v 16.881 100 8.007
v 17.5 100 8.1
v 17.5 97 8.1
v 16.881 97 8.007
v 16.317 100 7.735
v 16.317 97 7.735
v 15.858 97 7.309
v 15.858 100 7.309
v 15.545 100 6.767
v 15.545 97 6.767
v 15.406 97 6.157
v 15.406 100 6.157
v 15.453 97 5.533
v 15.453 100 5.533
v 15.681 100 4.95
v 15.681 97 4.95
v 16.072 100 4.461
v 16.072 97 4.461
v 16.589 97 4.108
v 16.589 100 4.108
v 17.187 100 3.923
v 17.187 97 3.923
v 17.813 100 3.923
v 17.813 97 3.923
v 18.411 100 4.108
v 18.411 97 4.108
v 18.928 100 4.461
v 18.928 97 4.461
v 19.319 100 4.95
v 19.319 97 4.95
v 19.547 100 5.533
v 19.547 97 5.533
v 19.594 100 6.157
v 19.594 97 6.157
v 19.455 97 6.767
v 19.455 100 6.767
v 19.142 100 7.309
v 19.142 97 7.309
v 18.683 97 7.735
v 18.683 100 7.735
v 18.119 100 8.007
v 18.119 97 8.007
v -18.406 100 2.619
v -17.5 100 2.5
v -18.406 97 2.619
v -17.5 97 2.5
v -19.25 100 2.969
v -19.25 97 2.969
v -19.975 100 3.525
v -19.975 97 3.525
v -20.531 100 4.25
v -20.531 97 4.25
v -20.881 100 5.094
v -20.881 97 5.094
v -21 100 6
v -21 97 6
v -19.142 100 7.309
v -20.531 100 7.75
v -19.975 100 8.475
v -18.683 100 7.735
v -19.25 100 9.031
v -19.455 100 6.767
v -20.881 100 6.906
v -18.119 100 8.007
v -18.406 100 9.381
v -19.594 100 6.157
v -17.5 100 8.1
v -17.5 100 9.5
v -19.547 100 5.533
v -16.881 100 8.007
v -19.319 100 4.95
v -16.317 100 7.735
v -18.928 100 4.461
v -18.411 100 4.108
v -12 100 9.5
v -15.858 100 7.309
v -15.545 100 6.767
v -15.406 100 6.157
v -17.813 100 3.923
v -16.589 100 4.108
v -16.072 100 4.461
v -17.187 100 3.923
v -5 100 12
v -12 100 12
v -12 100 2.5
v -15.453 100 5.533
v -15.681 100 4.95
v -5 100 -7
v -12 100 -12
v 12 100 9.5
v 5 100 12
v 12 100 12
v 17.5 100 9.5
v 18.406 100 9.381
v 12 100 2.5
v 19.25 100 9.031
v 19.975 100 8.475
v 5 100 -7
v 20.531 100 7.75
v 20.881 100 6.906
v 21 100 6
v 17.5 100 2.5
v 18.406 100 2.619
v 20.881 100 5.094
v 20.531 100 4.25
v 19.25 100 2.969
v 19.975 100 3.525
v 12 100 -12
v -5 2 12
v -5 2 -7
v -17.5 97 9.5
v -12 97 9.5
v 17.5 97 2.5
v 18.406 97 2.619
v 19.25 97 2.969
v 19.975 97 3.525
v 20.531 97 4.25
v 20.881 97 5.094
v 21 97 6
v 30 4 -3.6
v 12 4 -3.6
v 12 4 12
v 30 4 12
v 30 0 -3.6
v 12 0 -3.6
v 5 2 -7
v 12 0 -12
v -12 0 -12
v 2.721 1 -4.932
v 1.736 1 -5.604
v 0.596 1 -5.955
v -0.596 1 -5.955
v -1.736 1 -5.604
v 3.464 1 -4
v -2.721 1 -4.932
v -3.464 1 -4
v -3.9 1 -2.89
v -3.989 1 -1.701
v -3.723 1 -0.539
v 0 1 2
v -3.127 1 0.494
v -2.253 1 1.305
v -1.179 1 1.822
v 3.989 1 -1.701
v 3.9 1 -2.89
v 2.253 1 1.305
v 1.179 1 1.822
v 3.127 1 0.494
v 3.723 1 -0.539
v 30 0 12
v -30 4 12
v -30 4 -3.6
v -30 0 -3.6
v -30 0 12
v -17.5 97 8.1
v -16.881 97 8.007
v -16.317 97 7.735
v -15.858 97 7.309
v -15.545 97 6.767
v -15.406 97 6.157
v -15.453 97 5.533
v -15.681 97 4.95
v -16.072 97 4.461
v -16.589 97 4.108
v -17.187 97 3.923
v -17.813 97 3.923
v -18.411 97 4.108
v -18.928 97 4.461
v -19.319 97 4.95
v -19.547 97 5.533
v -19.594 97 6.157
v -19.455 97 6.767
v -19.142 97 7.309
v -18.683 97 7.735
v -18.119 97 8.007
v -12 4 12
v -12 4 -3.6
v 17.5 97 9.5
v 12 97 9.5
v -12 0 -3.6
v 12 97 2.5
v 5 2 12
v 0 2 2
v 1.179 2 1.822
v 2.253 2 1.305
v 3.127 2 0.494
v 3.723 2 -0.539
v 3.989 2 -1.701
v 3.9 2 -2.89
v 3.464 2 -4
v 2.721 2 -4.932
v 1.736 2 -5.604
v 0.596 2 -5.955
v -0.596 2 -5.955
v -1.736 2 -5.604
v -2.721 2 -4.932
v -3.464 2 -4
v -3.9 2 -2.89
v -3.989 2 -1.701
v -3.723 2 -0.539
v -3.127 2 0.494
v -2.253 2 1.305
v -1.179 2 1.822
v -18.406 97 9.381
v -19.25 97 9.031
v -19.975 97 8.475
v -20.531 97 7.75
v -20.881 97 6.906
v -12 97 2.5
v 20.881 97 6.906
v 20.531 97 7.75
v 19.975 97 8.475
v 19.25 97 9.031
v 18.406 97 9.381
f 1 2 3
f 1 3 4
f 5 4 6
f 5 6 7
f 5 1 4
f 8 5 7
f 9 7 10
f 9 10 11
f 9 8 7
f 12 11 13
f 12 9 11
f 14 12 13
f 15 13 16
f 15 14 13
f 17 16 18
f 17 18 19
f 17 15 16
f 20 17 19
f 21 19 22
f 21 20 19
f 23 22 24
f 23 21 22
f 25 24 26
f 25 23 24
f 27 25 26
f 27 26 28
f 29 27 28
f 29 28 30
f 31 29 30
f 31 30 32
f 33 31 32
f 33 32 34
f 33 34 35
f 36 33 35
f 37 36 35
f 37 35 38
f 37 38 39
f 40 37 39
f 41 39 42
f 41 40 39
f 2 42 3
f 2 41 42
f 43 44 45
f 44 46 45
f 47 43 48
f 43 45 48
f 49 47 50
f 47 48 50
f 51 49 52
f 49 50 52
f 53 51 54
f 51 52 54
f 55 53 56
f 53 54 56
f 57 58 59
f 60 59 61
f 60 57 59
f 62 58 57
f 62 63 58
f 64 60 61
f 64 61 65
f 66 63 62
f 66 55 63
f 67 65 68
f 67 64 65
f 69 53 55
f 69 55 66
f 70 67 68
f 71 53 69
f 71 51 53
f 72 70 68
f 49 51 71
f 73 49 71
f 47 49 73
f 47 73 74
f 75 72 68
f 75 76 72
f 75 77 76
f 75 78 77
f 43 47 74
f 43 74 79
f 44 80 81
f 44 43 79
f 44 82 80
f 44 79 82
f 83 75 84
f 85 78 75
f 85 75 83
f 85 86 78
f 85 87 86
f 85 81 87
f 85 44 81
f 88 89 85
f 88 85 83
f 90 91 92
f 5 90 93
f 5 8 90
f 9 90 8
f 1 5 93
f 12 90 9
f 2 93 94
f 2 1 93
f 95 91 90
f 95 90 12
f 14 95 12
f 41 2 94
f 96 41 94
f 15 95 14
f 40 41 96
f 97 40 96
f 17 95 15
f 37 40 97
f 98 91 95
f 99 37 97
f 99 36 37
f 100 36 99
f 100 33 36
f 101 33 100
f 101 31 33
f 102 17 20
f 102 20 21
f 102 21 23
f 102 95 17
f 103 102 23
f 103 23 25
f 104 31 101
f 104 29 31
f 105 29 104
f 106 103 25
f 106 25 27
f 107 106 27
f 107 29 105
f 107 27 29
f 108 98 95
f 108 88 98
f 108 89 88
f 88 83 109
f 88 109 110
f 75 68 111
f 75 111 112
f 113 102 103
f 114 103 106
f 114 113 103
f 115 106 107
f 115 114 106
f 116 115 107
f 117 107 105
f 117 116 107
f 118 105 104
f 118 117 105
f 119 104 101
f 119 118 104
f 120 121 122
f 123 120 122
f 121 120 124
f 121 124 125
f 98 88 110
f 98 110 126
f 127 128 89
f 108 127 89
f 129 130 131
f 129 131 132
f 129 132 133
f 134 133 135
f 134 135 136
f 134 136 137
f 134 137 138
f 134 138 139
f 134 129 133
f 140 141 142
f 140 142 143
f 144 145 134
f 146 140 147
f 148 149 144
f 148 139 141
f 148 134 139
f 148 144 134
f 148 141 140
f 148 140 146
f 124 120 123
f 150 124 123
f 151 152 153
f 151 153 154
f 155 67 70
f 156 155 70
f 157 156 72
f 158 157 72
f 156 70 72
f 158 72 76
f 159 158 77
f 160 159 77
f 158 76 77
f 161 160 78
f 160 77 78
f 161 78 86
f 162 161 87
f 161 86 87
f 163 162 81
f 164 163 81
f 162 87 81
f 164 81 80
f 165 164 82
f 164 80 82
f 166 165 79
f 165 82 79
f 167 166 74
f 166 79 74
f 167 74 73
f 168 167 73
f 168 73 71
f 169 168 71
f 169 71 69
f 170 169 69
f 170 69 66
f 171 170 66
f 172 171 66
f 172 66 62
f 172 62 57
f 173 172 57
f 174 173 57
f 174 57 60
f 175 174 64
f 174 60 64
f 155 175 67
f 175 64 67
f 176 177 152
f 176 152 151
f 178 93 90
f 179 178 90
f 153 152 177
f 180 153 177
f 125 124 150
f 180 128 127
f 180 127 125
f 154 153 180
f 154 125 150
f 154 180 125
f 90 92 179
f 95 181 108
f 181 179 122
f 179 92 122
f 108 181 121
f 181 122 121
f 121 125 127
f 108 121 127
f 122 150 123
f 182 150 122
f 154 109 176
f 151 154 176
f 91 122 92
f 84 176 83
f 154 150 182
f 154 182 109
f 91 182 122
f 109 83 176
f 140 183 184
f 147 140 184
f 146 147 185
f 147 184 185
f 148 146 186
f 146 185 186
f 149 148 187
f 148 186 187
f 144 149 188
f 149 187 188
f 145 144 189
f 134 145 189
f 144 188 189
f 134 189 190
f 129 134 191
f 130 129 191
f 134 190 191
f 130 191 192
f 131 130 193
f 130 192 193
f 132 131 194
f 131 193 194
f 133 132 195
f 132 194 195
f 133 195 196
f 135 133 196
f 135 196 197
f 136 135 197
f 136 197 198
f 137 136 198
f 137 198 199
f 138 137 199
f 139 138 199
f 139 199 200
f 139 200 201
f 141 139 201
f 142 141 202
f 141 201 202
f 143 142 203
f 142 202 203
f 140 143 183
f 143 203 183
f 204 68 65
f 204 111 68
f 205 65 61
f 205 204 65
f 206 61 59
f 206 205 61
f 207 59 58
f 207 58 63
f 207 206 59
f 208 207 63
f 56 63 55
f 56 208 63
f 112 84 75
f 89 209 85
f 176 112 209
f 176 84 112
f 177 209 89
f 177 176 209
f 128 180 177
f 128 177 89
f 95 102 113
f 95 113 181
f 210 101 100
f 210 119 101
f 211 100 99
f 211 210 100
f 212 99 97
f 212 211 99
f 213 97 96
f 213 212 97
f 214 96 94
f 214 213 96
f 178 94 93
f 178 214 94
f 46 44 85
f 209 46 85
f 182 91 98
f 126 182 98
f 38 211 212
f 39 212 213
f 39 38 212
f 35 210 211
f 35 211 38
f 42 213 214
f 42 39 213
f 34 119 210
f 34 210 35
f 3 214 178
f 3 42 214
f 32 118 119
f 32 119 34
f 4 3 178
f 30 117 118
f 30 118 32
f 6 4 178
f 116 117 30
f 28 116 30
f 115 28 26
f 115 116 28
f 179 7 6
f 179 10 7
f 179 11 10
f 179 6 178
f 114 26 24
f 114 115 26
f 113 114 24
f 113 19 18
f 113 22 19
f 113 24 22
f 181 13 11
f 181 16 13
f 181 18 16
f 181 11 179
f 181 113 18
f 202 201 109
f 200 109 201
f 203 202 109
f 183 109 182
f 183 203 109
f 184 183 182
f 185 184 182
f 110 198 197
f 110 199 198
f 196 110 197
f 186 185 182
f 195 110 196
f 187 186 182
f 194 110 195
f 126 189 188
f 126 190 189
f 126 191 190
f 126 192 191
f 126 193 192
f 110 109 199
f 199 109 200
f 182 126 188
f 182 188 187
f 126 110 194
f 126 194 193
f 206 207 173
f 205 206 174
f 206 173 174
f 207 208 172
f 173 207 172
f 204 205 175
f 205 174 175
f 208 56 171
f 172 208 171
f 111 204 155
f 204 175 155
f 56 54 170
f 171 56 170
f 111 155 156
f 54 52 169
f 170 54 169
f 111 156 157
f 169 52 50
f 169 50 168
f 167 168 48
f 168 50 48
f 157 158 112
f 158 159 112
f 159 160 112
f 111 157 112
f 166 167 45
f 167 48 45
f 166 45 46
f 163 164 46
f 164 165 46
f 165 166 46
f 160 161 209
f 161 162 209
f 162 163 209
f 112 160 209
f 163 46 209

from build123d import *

# Parameters (mm, degrees)
SKETCH1_W            = 24
SKETCH1_H            = 24
BOSS_EXTRUDE1_DEPTH  = 100
SKETCH3_W            = 10
SKETCH3_H            = 19
CUT_EXTRUDE1_DEPTH   = 98
SKETCH6_W            = 24
SKETCH6_H            = 4
BOSS_EXTRUDE3_DEPTH  = 18
SKETCH7_W            = 18
SKETCH7_H            = 8.4
CUT_EXTRUDE3_DEPTH   = 4
SKETCH8_R            = 4
CUT_EXTRUDE4_DEPTH   = 1
SKETCH9_W            = 9
SKETCH9_H            = 7
BOSS_EXTRUDE4_DEPTH  = 3
FILLET1_R            = 3.5
SKETCH10_R           = 2.1
CUT_EXTRUDE5_DEPTH   = 3
FILLET1_OF_MIRROR3_R = 3.5


with BuildPart() as part:
    # Sketch1 → Boss-Extrude1 (new body)
    with BuildSketch(Plane(origin=(0, 0, 0), x_dir=(1, 0, 0), z_dir=(0, 1, 0))):
        Rectangle(SKETCH1_W, SKETCH1_H)
    extrude(amount=BOSS_EXTRUDE1_DEPTH)

    # Sketch3 → Cut-Extrude1 (cut)
    with BuildSketch(Plane(origin=(0, 100, 0), x_dir=(1, 0, 0), z_dir=(0, 1, 0))):
        with Locations((0, -2.5)):
            Rectangle(SKETCH3_W, SKETCH3_H)
    extrude(amount=-CUT_EXTRUDE1_DEPTH, mode=Mode.SUBTRACT)

    # Sketch6 → Boss-Extrude3 (add)
    with BuildSketch(Plane.ZY.offset(12)):
        with Locations((0, 2)):
            Rectangle(SKETCH6_W, SKETCH6_H)
    boss_extrude3 = extrude(amount=BOSS_EXTRUDE3_DEPTH)

    # Sketch7 → Cut-Extrude3 (cut)
    with BuildSketch(Plane(origin=(0, 4, 0), x_dir=(1, 0, 0), z_dir=(0, 1, 0))):
        with Locations((-21, 7.8)):
            Rectangle(SKETCH7_W, SKETCH7_H)
    cut_extrude3 = extrude(amount=-CUT_EXTRUDE3_DEPTH, mode=Mode.SUBTRACT)

    # Mirror2: Boss-Extrude3, Cut-Extrude3 across plane
    add(boss_extrude3.mirror(Plane(origin=(0, 0, 0), x_dir=(0, 0, 1), z_dir=(1, 0, 0))))
    add(cut_extrude3.mirror(Plane(origin=(0, 0, 0), x_dir=(0, 0, 1), z_dir=(1, 0, 0))), mode=Mode.SUBTRACT)

    # Sketch8 → Cut-Extrude4 (cut)
    with BuildSketch(Plane(origin=(0, 2, 0), x_dir=(1, 0, 0), z_dir=(0, 1, 0))):
        with Locations(Location((0, 2, 0), (0, 0, 270))):
            Circle(SKETCH8_R)
    extrude(amount=-CUT_EXTRUDE4_DEPTH, mode=Mode.SUBTRACT)

    # Sketch9 → Boss-Extrude4 (add)
    with BuildSketch(Plane(origin=(0, 100, 0), x_dir=(1, 0, 0), z_dir=(0, 1, 0))):
        with Locations((-16.5, -6)):
            Rectangle(SKETCH9_W, SKETCH9_H)
    boss_extrude4 = extrude(amount=-BOSS_EXTRUDE4_DEPTH)

    # Fillet1
    fillet1_edges = [part.edges().sort_by_distance(p)[0] for p in [
        (-21, 98.5, 2.5),
        (-21, 98.5, 9.5),
    ]]
    fillet(fillet1_edges, radius=FILLET1_R - 0.0001)  # a hair under: the kernel refuses the full size

    # Sketch10 → Cut-Extrude5 (cut)
    with BuildSketch(Plane(origin=(0, 100, 0), x_dir=(1, 0, 0), z_dir=(0, 1, 0))):
        with Locations(Location((-17.5, -6, 0), (0, 0, 270))):
            Circle(SKETCH10_R)
    cut_extrude5 = extrude(amount=-CUT_EXTRUDE5_DEPTH, mode=Mode.SUBTRACT)

    # Mirror3: Boss-Extrude4, Cut-Extrude5 across plane
    add(boss_extrude4.mirror(Plane(origin=(0, 0, 0), x_dir=(0, 0, 1), z_dir=(1, 0, 0))))
    add(cut_extrude5.mirror(Plane(origin=(0, 0, 0), x_dir=(0, 0, 1), z_dir=(1, 0, 0))), mode=Mode.SUBTRACT)

    # Fillet1 of Mirror3
    fillet1_of_mirror3_edges = [part.edges().sort_by_distance(p)[0] for p in [
        (21, 98.5, 2.5),
        (21, 98.5, 9.5),
    ]]
    fillet(fillet1_of_mirror3_edges, radius=FILLET1_OF_MIRROR3_R - 0.0001)  # a hair under: the kernel refuses the full size


solid = part.part
